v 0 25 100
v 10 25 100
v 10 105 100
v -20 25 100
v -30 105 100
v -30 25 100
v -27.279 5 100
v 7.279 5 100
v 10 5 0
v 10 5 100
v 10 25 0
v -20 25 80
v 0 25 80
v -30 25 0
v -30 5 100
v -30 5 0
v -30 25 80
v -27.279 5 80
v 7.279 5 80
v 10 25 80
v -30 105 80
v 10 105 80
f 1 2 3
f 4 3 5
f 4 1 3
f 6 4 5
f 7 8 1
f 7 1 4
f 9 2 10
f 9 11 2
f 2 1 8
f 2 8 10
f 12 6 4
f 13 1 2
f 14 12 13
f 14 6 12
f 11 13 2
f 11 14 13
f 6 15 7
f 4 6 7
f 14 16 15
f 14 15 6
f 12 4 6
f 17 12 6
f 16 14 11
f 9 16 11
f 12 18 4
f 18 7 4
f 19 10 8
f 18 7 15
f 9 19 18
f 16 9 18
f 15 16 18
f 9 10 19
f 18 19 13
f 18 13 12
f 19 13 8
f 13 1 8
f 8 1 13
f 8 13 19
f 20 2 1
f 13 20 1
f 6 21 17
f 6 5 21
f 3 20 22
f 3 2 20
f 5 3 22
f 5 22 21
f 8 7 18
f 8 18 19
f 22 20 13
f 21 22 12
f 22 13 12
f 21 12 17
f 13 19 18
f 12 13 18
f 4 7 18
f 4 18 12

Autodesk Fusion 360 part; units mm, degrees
sketch "Base" plane through (0, 0, 0) normal (0, 0, 1) x (1, 0, 0)
  line L0 (-30, 25) -> (10, 25)
  line L1 (10, 25) -> (10, 5)
  line L2 (10, 5) -> (-30, 5)
  line L3 (-30, 5) -> (-30, 25)
  dimension "d6" = 40
  dimension "d7" = 20
extrude "Extrude1" add sketch "Base" along normal blind 100 makes body 1
sketch "Top" plane through (0, 0, 100) normal (0, 0, 1) x (-1, 0, 0)
  line L0 (30, -5) -> (-10, -5)
  line L1 (-10, -5) -> (-10, -25)
  line L2 (-10, -25) -> (30, -25)
  line L3 (30, -25) -> (30, -5)
  line L4 (30, -5) -> (-10, -5)
  line L5 (-10, -5) -> (-10, -105)
  line L6 (-10, -105) -> (30, -105)
  line L7 (30, -105) -> (30, -5)
  line L8 (-10, -25) -> (0, -25)
  line L9 (0, -25) -> (-7.2794, -5)
  line L10 (-7.2794, -5) -> (27.2794, -5)
  line L11 (27.2794, -5) -> (20, -25)
  line L12 (30, -25) -> (20, -25)
  dimension "d10" = 40
  dimension "d11" = 100
  dimension "d12" = 10
  dimension "d13" = 10
  dimension "d14" = 70
  dimension "d15" = 70
extrude "Extrude1'" add sketch "Top" against normal blind 20 separate body contours L0 L2 L4 L9 L10 L11 | L2 L5 L6 L7 L8 L12 makes body 2 in component "Top"
combine "Combine1" operation cut target body 1 tool bodies 2 keep tools
copy_body "Body->Comp1" bodies 1 removing the originals makes body 3 in component "Bottom"
component "Top" placed x (1, 0, 0) y (0, 1, 0) z (0, 0, 1) at (0, 0, 0)
component "Bottom" placed x (1, 0, 0) y (0, 1, 0) z (0, 0, 1) at (0, 0, 0)
equation "width = 40 mm"
equation "lenght = 100 mm"
equation "thickness = 20 mm"
equation "pin = 10 mm"
equation "angle = 70 deg"
equation "d6 = width"
equation "d7 = thickness"
equation "d8 = lenght"
equation "d10 = width"
equation "d11 = lenght"
equation "d12 = pin"
equation "d13 = pin"
equation "d14 = angle"
equation "d15 = angle"
equation "d16 = -thickness"
